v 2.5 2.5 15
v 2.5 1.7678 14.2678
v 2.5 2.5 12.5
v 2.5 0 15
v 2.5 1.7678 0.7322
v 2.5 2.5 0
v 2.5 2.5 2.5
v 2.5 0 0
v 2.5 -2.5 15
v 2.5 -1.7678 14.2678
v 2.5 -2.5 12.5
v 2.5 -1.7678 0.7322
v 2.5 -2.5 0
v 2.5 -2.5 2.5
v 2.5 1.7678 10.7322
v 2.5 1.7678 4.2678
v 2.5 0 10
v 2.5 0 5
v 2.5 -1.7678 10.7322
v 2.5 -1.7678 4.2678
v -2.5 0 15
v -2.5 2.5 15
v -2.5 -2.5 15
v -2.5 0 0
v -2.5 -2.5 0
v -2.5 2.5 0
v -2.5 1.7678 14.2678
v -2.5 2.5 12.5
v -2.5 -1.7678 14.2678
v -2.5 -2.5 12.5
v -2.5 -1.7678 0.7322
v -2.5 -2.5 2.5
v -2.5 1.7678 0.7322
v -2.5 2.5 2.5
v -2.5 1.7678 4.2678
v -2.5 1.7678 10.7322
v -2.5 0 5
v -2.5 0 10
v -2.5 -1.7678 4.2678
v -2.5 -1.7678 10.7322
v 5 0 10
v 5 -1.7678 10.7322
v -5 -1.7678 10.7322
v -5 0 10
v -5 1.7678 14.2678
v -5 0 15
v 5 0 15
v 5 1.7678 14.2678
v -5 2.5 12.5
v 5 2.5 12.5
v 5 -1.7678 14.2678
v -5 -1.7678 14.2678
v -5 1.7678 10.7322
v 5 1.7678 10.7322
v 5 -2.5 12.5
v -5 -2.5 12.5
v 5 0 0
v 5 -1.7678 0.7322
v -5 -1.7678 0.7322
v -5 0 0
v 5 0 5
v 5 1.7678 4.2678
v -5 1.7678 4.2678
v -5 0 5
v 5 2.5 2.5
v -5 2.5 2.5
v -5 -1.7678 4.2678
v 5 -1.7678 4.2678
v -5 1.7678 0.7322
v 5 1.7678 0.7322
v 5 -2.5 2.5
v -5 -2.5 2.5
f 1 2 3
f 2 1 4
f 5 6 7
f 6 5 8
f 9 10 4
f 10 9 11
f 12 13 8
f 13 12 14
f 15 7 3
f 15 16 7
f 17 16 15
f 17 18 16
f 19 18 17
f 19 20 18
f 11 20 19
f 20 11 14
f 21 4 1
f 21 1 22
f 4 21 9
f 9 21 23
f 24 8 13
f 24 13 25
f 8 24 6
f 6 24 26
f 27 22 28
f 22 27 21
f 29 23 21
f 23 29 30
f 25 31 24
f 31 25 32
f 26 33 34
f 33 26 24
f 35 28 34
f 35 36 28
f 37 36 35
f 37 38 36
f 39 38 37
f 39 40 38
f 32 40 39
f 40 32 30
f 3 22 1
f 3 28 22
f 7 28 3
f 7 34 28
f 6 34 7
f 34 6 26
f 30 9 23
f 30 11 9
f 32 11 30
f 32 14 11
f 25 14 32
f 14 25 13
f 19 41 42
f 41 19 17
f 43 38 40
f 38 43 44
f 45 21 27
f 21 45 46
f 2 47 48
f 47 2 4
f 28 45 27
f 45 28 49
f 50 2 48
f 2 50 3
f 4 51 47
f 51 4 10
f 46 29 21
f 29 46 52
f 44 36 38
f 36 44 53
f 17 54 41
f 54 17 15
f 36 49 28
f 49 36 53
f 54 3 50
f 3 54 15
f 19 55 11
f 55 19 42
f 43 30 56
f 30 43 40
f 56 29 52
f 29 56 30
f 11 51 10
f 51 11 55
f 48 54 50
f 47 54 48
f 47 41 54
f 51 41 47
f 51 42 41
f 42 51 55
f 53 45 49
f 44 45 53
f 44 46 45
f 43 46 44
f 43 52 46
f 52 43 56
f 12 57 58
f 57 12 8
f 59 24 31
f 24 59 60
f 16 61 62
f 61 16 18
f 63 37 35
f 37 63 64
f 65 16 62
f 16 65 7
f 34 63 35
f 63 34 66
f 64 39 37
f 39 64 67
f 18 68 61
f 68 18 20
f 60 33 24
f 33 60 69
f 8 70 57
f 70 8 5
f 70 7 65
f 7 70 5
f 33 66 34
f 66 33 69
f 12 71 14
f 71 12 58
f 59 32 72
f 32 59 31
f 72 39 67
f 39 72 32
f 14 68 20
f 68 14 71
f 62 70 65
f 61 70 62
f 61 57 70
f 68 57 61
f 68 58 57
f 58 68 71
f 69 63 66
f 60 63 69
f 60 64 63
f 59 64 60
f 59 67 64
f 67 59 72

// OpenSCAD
union() {
// The Box
width = 5;
depth = 5;
height = 15;
translate([-width / 2, -depth / 2, 0]) cube([width, depth, height]);

// Cylinders
cyl_height = width * 2;
cyl_radius = depth / 2;
xrot = 90;
zrot = 90;
// Cylinder 0
cyl0x = -cyl_height/2;
cyl0y = 0;
cyl0z = height - cyl_radius;
// Cylinder 1
cyl1x = -cyl_height/2;
cyl1y = 0;
cyl1z = cyl_radius;

translate([cyl0x, cyl0y, cyl0z]) rotate(a=[xrot, 0, zrot]) cylinder(cyl_height, cyl_radius, cyl_radius);

translate([cyl1x, cyl1y, cyl1z]) rotate(a=[xrot, 0, zrot]) cylinder(cyl_height, cyl_radius, cyl_radius);
}
